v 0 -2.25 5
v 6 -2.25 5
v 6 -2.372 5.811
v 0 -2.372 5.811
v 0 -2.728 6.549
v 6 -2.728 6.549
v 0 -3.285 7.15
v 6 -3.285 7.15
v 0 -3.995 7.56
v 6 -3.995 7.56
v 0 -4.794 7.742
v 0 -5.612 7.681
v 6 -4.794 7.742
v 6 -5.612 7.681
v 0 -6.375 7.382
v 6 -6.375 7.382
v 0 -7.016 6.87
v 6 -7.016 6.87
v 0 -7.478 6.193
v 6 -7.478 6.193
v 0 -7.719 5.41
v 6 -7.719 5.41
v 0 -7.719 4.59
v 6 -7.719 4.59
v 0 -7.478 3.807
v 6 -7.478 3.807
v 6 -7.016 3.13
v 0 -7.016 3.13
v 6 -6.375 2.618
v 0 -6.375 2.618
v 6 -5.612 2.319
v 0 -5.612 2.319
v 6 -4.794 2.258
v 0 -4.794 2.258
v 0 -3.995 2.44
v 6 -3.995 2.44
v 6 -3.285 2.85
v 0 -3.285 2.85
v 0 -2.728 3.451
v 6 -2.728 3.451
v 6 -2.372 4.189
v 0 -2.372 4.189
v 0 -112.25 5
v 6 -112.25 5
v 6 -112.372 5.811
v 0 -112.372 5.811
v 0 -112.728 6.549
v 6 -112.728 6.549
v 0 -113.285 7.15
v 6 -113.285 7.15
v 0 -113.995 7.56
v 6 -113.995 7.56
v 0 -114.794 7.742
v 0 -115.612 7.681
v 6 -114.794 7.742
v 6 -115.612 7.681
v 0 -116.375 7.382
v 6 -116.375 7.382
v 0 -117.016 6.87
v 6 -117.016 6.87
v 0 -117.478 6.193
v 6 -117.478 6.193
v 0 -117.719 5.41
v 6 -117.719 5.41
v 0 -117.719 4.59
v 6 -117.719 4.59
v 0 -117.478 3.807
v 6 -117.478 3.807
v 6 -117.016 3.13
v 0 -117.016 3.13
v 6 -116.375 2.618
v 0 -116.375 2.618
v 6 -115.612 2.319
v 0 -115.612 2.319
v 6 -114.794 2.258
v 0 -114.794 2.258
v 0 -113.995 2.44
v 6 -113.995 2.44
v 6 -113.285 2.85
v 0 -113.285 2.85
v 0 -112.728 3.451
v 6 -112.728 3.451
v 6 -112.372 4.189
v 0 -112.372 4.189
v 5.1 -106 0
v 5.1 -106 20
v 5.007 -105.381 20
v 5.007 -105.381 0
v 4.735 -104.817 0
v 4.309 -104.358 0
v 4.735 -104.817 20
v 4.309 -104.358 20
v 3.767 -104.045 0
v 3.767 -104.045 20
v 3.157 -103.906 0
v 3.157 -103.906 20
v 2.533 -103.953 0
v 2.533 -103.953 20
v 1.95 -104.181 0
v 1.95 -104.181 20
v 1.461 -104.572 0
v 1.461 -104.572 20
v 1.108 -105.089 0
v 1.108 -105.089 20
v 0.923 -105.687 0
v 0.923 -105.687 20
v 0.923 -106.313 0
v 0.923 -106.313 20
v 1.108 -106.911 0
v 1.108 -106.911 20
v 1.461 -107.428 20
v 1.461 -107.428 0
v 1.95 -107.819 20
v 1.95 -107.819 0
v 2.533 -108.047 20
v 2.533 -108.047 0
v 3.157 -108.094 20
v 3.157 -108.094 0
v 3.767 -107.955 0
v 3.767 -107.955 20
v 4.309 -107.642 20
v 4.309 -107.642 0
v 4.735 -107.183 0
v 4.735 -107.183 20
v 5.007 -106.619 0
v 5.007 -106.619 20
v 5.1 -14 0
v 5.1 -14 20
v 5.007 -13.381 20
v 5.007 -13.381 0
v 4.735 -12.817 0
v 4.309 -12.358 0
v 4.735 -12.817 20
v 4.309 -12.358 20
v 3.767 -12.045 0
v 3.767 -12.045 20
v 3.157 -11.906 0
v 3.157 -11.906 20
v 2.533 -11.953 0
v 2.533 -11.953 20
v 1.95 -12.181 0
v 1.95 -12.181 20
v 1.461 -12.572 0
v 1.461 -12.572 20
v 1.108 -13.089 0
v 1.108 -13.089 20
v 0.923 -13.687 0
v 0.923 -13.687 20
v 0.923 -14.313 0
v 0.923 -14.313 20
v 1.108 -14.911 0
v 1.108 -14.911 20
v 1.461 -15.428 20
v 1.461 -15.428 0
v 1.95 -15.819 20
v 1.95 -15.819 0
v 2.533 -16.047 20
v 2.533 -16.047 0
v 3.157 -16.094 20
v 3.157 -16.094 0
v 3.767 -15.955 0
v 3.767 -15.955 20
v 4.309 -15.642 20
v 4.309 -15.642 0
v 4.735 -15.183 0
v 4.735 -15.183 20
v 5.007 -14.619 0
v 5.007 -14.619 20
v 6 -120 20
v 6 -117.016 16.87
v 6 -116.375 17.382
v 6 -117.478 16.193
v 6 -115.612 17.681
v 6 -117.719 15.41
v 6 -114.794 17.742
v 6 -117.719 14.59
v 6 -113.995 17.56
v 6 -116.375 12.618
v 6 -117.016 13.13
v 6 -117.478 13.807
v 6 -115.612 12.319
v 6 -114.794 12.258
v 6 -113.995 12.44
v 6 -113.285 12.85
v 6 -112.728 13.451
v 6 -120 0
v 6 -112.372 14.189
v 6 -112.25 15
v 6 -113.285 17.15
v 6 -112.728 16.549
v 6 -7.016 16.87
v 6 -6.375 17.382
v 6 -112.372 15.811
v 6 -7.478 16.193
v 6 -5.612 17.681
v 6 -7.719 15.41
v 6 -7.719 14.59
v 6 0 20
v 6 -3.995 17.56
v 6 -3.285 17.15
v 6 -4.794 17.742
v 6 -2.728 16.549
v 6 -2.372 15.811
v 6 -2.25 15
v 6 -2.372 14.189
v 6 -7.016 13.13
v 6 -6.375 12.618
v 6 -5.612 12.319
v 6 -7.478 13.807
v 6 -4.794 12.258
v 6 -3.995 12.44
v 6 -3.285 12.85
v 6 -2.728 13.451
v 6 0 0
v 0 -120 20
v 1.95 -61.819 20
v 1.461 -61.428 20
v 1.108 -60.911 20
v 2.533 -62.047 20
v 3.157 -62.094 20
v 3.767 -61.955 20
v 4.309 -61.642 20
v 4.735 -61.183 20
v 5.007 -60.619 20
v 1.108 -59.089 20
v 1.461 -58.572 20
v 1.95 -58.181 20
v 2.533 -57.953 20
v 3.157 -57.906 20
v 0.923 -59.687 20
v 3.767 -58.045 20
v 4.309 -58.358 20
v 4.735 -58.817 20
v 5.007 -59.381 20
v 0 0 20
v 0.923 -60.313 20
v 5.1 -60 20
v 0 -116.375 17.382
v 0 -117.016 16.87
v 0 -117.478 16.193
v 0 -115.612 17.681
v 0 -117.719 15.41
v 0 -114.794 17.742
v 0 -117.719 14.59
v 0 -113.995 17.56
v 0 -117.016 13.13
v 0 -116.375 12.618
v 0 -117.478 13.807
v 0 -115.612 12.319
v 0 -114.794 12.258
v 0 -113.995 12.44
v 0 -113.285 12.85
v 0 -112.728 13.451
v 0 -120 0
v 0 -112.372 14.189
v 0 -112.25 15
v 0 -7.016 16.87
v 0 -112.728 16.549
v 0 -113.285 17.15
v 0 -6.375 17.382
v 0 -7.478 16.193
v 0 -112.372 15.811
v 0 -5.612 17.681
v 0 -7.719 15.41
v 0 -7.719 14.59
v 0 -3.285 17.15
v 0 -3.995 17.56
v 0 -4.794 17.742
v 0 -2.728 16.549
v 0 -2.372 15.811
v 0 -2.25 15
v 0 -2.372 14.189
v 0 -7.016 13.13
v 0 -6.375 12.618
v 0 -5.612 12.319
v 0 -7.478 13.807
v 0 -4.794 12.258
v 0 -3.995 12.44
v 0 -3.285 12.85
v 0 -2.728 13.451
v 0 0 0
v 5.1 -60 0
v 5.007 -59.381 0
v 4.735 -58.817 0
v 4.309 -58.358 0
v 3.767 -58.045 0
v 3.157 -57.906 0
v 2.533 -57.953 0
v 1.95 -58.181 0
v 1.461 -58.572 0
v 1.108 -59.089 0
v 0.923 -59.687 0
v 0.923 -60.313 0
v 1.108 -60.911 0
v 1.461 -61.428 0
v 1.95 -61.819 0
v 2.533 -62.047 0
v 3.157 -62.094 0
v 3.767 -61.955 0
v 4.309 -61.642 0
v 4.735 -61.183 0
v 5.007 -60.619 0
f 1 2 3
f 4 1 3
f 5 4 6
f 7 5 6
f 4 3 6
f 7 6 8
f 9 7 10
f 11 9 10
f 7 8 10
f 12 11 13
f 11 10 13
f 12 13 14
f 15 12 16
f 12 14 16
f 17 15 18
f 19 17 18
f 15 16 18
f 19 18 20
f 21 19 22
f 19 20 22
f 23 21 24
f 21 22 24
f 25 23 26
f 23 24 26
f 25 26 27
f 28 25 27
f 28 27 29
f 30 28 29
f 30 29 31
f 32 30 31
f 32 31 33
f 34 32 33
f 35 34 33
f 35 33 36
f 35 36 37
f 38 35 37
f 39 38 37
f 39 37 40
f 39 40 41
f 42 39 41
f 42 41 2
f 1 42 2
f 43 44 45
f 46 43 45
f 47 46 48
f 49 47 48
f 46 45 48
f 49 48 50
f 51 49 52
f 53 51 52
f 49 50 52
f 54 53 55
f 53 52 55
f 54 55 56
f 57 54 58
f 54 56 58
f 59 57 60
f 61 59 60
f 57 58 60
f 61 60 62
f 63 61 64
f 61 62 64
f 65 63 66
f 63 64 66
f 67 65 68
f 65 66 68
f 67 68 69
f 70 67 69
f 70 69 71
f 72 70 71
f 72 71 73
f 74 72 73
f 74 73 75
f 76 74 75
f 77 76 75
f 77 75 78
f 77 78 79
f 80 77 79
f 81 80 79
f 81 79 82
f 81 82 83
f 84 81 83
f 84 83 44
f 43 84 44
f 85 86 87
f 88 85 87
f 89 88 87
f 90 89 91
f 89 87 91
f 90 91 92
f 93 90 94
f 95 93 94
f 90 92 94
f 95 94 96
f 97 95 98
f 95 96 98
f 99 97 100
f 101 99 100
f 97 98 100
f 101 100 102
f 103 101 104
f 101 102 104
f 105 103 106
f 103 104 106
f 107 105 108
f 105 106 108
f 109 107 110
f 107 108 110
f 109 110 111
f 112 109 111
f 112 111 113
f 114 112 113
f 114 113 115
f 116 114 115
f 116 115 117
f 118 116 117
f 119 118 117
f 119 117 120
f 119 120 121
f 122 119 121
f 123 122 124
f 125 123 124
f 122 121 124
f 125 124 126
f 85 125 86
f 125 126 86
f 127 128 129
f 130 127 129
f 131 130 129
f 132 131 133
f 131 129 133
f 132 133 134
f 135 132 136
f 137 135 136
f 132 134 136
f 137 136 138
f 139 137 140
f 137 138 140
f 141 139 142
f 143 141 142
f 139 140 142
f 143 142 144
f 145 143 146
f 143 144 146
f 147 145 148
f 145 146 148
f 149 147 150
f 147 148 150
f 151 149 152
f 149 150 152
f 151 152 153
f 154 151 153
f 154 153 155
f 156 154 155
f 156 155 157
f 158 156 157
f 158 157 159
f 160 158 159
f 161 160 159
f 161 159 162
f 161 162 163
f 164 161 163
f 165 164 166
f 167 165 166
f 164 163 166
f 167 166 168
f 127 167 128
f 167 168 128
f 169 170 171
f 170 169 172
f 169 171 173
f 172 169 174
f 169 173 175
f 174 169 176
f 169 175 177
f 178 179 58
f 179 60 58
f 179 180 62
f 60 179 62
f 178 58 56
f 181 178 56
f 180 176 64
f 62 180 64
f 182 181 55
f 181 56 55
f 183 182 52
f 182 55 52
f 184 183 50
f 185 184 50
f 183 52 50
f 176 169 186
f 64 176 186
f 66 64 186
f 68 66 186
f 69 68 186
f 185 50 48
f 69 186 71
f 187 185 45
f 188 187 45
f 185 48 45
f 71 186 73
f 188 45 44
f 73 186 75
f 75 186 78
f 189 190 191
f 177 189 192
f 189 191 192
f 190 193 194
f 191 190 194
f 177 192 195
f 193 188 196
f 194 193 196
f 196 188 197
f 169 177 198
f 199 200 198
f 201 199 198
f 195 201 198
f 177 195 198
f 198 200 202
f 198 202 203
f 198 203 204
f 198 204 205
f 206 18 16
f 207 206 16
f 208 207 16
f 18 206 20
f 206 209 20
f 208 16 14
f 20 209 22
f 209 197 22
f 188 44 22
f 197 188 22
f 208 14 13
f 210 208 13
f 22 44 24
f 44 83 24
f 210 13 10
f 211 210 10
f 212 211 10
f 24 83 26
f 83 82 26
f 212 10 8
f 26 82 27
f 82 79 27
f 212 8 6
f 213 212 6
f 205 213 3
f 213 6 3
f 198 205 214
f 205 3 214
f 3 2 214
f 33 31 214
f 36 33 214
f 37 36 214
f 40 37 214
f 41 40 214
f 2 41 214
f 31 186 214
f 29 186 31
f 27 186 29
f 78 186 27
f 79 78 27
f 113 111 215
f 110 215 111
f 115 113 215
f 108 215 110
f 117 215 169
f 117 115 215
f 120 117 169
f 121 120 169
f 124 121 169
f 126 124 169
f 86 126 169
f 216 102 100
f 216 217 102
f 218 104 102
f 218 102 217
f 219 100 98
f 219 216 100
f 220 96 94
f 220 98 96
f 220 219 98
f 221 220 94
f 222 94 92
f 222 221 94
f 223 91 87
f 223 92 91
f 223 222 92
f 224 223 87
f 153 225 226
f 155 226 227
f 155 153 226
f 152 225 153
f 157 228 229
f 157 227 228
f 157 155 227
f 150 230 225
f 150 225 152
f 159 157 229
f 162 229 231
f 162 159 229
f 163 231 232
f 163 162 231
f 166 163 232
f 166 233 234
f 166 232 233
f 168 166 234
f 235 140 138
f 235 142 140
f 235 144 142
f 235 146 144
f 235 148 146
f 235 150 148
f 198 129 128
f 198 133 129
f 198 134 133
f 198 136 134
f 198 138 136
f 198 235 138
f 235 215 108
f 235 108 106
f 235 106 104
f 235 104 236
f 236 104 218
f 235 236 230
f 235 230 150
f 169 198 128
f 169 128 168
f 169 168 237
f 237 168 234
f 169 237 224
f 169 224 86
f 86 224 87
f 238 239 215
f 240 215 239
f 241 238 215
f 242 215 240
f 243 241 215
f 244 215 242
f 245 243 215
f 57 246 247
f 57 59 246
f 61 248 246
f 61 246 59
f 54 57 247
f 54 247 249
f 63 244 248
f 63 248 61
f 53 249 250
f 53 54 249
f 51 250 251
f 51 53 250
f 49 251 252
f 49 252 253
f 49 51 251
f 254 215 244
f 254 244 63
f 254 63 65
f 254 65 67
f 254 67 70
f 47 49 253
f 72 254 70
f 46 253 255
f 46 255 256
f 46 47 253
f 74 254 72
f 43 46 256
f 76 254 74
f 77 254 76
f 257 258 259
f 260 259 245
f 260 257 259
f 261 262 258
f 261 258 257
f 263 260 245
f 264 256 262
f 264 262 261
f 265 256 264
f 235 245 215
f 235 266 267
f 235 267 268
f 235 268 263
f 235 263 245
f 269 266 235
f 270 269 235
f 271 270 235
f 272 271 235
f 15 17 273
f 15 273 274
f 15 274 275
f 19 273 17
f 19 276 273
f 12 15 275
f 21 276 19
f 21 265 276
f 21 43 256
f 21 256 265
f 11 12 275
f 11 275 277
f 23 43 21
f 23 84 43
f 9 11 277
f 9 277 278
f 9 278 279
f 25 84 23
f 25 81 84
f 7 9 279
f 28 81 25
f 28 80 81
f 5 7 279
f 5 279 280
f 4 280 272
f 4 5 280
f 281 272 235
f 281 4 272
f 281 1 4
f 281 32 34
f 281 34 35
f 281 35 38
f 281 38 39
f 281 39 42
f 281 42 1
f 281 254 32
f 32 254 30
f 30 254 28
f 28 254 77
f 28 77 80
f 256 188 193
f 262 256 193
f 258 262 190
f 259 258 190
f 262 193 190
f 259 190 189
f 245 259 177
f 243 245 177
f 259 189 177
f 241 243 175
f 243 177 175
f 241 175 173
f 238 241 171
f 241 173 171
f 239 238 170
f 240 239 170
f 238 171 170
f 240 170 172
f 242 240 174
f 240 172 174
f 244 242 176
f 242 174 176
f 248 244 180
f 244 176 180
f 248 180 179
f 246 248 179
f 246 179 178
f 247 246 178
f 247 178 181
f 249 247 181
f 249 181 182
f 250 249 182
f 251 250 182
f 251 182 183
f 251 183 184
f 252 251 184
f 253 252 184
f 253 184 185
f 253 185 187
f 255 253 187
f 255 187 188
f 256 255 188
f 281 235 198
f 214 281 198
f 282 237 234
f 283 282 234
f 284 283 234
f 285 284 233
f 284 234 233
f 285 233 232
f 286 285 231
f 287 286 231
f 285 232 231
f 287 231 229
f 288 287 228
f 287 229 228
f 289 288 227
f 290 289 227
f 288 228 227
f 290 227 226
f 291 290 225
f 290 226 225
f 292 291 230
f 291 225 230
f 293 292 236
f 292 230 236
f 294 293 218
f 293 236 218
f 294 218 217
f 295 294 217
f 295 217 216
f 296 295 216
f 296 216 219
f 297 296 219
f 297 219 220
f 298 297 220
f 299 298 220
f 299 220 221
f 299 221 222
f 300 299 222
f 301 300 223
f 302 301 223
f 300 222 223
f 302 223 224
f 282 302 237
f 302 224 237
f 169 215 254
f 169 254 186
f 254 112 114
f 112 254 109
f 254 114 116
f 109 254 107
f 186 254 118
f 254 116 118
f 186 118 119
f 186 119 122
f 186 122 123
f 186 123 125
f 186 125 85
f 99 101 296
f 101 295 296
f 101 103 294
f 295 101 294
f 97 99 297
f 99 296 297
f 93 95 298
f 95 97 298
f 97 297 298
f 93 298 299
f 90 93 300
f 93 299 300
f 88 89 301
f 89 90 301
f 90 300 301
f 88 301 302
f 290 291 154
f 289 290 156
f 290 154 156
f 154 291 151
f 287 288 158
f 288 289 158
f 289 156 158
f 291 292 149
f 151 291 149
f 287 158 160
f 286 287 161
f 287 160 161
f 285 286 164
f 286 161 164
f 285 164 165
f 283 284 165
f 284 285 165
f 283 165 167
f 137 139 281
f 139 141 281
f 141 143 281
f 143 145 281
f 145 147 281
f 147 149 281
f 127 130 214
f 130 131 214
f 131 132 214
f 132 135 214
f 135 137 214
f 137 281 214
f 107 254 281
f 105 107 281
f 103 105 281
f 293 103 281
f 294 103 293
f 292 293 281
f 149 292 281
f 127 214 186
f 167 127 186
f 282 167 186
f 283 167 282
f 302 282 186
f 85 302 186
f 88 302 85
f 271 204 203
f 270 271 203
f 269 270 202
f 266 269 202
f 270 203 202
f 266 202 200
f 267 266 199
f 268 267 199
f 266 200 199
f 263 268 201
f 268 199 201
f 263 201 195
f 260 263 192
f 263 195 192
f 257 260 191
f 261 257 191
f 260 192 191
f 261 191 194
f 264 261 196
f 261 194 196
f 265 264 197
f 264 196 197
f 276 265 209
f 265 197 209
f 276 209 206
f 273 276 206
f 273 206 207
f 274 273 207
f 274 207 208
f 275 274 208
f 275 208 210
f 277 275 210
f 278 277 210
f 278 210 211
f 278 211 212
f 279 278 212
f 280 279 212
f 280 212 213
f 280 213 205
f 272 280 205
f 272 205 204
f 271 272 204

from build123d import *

# Parameters (mm, degrees)
F0_W     = 6
F0_H     = 120
F1_DEPTH = 20
F2_R     = 2.1
F3_DEPTH = 20
F4_R     = 2.75
F5_DEPTH = 25


with BuildPart() as f1:
    # F0 (on Top) → F1 (new body)
    with BuildSketch(Plane.XY):
        with Locations((3, -60)):
            Rectangle(F0_W, F0_H)
    extrude(amount=F1_DEPTH)

    # F2 (on face) → F3 (cut)
    with BuildSketch(Plane.XY.offset(20)):
        with Locations((3, -14)):
            Circle(F2_R)
        with Locations((3, -106)):
            Circle(F2_R)
        with Locations((3, -60)):
            Circle(F2_R)
    extrude(amount=-F3_DEPTH, mode=Mode.SUBTRACT)

    # F4 (on face) → F5 (cut)
    with BuildSketch(Plane.YZ.offset(6)):
        with Locations((-115, 15)):
            Circle(F4_R)
        with Locations((-115, 5)):
            Circle(F4_R)
        with Locations((-5, 5)):
            Circle(F4_R)
        with Locations((-5, 15)):
            Circle(F4_R)
    extrude(amount=-F5_DEPTH, mode=Mode.SUBTRACT)


solid = f1.part
